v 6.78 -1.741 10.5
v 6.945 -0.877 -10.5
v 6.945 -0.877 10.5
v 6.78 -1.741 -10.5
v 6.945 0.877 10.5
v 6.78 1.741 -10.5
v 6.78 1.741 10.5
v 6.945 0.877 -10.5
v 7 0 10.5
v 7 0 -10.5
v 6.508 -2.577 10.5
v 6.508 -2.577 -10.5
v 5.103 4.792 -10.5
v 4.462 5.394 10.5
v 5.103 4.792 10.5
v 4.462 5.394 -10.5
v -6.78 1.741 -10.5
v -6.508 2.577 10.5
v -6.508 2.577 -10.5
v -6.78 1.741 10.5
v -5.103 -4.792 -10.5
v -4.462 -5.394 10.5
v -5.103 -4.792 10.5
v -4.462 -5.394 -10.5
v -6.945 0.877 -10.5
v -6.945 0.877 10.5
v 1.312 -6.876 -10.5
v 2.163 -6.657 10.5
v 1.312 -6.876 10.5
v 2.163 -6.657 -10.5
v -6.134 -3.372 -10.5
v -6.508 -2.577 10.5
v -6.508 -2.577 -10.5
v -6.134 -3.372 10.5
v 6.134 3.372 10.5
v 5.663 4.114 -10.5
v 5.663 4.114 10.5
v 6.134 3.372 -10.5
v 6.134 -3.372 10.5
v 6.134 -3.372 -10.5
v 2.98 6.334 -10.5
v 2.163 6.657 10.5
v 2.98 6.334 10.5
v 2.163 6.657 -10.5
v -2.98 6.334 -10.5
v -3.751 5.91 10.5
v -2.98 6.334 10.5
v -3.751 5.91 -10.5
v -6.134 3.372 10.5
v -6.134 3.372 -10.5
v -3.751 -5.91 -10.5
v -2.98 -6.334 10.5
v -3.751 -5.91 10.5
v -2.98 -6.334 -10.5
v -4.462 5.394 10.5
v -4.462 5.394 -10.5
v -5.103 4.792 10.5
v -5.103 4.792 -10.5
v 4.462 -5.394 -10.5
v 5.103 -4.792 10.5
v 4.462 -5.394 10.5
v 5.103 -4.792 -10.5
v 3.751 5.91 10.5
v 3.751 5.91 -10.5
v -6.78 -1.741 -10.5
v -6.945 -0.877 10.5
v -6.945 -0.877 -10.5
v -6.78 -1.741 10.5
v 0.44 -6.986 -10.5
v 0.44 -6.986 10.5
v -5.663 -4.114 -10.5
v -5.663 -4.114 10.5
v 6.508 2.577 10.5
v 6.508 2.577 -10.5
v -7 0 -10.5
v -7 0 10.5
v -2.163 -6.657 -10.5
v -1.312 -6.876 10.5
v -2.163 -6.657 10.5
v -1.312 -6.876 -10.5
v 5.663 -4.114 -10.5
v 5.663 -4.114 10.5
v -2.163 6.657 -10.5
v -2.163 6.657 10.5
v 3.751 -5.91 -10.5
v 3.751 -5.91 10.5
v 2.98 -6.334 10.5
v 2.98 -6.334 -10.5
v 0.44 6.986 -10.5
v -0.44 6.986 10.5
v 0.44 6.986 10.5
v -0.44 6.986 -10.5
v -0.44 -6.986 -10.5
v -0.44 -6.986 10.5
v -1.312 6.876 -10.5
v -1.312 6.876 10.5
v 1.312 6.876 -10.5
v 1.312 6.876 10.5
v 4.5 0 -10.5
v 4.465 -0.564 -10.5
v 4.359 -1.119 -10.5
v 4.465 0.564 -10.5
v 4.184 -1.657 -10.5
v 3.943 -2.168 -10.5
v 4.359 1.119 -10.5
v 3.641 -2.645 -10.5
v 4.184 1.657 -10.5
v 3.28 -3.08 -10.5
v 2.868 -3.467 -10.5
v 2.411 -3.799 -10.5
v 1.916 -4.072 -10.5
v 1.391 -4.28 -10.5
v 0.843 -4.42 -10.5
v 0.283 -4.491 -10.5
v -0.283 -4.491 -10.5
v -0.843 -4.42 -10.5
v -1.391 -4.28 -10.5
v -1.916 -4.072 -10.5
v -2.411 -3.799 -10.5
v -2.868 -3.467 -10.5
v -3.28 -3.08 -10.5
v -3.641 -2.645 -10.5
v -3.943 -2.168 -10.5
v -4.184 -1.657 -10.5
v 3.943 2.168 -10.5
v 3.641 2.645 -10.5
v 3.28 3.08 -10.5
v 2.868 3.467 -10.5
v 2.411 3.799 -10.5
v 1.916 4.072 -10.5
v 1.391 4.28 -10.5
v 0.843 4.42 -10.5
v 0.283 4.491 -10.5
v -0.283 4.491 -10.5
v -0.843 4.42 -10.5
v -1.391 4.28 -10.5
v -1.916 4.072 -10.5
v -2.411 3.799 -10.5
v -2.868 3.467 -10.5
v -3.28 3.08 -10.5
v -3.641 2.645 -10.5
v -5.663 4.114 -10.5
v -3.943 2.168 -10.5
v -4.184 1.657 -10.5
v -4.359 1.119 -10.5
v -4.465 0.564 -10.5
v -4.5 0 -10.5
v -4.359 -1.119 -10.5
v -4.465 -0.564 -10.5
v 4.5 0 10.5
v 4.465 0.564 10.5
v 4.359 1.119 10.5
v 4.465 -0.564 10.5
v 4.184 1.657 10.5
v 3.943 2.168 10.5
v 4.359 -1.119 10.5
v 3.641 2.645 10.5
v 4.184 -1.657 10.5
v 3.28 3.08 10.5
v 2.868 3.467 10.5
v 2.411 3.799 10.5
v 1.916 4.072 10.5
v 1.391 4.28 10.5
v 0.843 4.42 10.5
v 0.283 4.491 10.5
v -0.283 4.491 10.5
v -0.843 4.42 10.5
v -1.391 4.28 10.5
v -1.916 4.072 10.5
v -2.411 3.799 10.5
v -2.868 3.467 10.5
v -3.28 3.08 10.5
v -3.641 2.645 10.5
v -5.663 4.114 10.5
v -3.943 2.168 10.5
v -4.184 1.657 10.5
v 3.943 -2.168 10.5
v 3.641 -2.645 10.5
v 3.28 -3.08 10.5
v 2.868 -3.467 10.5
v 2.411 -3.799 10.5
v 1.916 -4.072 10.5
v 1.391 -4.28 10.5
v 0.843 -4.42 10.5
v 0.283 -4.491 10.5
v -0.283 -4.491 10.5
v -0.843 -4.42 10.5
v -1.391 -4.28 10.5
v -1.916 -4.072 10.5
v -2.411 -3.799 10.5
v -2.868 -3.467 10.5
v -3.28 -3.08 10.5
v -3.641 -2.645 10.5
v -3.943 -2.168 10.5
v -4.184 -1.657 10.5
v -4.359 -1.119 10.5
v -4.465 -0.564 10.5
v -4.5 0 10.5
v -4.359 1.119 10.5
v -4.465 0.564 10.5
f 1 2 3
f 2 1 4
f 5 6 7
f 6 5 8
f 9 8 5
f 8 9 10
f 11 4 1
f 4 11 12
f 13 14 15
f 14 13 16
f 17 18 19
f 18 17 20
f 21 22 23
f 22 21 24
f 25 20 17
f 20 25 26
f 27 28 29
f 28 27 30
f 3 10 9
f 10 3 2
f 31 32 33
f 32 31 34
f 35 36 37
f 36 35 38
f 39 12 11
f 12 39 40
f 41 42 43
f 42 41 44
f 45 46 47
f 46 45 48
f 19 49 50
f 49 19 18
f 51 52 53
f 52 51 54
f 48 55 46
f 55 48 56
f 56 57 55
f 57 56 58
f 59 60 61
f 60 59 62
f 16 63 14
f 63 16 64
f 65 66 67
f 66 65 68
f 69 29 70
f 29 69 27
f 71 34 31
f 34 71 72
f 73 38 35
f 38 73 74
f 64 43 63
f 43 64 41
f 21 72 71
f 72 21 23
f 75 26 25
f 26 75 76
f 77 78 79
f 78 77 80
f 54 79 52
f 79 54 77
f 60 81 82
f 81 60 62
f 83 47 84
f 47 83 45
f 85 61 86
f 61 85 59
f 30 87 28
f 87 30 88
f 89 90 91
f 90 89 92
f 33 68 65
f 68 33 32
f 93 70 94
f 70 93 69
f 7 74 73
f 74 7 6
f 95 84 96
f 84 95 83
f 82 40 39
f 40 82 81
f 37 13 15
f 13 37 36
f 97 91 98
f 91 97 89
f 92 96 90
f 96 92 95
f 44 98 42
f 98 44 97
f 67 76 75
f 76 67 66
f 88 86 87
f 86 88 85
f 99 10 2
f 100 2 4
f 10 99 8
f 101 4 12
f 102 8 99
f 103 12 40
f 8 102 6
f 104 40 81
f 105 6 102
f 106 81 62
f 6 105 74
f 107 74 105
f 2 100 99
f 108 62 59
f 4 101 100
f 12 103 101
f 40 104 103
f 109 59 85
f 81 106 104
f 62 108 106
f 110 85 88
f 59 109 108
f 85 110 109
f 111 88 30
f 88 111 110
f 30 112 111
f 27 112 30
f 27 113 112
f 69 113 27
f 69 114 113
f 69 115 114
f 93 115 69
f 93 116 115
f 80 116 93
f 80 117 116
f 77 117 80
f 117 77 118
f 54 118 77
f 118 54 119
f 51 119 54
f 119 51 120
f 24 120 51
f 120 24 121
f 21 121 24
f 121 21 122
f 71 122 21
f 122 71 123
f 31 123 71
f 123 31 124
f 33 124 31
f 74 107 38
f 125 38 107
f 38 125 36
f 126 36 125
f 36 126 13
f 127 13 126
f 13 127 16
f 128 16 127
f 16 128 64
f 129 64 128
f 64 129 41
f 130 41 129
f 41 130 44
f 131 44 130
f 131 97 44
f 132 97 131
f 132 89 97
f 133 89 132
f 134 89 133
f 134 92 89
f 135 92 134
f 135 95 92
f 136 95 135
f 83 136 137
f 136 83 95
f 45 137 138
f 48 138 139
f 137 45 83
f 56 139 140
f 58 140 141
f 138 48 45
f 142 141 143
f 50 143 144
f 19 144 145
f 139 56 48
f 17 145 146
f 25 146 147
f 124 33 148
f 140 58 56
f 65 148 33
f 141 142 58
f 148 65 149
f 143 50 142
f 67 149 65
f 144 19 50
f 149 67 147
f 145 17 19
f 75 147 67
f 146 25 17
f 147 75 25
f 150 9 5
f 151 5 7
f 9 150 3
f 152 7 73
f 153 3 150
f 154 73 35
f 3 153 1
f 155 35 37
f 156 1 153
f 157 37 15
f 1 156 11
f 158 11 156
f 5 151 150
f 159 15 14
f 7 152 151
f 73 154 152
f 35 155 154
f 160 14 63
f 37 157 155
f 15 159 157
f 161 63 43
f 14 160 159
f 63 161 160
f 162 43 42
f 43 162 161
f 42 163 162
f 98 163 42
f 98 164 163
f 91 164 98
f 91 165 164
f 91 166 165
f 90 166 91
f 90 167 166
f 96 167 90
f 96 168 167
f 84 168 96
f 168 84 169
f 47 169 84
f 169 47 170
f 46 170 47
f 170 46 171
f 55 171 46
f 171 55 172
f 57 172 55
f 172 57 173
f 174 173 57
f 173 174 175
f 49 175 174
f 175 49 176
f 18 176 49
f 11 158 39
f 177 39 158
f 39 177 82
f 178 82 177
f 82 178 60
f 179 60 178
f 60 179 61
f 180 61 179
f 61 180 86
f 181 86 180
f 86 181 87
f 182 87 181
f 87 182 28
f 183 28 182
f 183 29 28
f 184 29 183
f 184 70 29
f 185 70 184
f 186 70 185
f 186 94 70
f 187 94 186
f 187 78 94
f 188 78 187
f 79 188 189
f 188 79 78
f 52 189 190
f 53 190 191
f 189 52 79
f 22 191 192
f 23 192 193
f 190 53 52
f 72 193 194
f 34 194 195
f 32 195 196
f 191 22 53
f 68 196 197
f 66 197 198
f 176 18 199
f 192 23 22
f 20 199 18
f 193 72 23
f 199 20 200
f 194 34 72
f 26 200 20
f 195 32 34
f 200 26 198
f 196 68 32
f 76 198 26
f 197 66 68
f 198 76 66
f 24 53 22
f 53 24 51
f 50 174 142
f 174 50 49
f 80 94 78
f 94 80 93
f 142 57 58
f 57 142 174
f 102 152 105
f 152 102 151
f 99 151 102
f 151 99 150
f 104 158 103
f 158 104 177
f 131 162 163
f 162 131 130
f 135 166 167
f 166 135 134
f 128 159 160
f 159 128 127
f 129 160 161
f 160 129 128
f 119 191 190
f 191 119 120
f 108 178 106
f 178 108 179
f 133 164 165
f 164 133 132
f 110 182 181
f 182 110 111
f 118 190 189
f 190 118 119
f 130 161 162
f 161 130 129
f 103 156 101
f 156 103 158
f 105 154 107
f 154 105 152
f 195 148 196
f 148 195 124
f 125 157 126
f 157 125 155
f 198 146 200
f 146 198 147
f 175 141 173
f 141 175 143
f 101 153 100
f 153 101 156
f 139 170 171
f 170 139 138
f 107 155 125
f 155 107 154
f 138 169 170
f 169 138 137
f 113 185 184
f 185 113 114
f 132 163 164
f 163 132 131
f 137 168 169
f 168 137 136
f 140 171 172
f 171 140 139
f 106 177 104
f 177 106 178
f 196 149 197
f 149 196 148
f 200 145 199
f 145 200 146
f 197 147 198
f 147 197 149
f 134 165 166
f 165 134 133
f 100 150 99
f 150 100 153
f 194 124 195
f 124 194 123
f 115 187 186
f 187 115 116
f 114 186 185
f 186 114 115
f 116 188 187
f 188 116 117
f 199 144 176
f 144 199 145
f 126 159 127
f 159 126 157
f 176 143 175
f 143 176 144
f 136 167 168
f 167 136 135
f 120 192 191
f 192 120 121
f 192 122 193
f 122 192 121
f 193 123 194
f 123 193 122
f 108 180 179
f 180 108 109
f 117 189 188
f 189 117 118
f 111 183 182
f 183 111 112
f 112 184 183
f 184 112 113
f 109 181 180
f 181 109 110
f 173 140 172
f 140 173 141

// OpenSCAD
$fn = 50;


difference() {
	union() {
		translate(v = [0, 0, -10.5000000000]) {
			cylinder(h = 21, r = 7.0000000000);
		}
	}
	union() {
		translate(v = [0, 0, -100.0000000000]) {
			cylinder(h = 200, r = 4.5000000000);
		}
	}
}
